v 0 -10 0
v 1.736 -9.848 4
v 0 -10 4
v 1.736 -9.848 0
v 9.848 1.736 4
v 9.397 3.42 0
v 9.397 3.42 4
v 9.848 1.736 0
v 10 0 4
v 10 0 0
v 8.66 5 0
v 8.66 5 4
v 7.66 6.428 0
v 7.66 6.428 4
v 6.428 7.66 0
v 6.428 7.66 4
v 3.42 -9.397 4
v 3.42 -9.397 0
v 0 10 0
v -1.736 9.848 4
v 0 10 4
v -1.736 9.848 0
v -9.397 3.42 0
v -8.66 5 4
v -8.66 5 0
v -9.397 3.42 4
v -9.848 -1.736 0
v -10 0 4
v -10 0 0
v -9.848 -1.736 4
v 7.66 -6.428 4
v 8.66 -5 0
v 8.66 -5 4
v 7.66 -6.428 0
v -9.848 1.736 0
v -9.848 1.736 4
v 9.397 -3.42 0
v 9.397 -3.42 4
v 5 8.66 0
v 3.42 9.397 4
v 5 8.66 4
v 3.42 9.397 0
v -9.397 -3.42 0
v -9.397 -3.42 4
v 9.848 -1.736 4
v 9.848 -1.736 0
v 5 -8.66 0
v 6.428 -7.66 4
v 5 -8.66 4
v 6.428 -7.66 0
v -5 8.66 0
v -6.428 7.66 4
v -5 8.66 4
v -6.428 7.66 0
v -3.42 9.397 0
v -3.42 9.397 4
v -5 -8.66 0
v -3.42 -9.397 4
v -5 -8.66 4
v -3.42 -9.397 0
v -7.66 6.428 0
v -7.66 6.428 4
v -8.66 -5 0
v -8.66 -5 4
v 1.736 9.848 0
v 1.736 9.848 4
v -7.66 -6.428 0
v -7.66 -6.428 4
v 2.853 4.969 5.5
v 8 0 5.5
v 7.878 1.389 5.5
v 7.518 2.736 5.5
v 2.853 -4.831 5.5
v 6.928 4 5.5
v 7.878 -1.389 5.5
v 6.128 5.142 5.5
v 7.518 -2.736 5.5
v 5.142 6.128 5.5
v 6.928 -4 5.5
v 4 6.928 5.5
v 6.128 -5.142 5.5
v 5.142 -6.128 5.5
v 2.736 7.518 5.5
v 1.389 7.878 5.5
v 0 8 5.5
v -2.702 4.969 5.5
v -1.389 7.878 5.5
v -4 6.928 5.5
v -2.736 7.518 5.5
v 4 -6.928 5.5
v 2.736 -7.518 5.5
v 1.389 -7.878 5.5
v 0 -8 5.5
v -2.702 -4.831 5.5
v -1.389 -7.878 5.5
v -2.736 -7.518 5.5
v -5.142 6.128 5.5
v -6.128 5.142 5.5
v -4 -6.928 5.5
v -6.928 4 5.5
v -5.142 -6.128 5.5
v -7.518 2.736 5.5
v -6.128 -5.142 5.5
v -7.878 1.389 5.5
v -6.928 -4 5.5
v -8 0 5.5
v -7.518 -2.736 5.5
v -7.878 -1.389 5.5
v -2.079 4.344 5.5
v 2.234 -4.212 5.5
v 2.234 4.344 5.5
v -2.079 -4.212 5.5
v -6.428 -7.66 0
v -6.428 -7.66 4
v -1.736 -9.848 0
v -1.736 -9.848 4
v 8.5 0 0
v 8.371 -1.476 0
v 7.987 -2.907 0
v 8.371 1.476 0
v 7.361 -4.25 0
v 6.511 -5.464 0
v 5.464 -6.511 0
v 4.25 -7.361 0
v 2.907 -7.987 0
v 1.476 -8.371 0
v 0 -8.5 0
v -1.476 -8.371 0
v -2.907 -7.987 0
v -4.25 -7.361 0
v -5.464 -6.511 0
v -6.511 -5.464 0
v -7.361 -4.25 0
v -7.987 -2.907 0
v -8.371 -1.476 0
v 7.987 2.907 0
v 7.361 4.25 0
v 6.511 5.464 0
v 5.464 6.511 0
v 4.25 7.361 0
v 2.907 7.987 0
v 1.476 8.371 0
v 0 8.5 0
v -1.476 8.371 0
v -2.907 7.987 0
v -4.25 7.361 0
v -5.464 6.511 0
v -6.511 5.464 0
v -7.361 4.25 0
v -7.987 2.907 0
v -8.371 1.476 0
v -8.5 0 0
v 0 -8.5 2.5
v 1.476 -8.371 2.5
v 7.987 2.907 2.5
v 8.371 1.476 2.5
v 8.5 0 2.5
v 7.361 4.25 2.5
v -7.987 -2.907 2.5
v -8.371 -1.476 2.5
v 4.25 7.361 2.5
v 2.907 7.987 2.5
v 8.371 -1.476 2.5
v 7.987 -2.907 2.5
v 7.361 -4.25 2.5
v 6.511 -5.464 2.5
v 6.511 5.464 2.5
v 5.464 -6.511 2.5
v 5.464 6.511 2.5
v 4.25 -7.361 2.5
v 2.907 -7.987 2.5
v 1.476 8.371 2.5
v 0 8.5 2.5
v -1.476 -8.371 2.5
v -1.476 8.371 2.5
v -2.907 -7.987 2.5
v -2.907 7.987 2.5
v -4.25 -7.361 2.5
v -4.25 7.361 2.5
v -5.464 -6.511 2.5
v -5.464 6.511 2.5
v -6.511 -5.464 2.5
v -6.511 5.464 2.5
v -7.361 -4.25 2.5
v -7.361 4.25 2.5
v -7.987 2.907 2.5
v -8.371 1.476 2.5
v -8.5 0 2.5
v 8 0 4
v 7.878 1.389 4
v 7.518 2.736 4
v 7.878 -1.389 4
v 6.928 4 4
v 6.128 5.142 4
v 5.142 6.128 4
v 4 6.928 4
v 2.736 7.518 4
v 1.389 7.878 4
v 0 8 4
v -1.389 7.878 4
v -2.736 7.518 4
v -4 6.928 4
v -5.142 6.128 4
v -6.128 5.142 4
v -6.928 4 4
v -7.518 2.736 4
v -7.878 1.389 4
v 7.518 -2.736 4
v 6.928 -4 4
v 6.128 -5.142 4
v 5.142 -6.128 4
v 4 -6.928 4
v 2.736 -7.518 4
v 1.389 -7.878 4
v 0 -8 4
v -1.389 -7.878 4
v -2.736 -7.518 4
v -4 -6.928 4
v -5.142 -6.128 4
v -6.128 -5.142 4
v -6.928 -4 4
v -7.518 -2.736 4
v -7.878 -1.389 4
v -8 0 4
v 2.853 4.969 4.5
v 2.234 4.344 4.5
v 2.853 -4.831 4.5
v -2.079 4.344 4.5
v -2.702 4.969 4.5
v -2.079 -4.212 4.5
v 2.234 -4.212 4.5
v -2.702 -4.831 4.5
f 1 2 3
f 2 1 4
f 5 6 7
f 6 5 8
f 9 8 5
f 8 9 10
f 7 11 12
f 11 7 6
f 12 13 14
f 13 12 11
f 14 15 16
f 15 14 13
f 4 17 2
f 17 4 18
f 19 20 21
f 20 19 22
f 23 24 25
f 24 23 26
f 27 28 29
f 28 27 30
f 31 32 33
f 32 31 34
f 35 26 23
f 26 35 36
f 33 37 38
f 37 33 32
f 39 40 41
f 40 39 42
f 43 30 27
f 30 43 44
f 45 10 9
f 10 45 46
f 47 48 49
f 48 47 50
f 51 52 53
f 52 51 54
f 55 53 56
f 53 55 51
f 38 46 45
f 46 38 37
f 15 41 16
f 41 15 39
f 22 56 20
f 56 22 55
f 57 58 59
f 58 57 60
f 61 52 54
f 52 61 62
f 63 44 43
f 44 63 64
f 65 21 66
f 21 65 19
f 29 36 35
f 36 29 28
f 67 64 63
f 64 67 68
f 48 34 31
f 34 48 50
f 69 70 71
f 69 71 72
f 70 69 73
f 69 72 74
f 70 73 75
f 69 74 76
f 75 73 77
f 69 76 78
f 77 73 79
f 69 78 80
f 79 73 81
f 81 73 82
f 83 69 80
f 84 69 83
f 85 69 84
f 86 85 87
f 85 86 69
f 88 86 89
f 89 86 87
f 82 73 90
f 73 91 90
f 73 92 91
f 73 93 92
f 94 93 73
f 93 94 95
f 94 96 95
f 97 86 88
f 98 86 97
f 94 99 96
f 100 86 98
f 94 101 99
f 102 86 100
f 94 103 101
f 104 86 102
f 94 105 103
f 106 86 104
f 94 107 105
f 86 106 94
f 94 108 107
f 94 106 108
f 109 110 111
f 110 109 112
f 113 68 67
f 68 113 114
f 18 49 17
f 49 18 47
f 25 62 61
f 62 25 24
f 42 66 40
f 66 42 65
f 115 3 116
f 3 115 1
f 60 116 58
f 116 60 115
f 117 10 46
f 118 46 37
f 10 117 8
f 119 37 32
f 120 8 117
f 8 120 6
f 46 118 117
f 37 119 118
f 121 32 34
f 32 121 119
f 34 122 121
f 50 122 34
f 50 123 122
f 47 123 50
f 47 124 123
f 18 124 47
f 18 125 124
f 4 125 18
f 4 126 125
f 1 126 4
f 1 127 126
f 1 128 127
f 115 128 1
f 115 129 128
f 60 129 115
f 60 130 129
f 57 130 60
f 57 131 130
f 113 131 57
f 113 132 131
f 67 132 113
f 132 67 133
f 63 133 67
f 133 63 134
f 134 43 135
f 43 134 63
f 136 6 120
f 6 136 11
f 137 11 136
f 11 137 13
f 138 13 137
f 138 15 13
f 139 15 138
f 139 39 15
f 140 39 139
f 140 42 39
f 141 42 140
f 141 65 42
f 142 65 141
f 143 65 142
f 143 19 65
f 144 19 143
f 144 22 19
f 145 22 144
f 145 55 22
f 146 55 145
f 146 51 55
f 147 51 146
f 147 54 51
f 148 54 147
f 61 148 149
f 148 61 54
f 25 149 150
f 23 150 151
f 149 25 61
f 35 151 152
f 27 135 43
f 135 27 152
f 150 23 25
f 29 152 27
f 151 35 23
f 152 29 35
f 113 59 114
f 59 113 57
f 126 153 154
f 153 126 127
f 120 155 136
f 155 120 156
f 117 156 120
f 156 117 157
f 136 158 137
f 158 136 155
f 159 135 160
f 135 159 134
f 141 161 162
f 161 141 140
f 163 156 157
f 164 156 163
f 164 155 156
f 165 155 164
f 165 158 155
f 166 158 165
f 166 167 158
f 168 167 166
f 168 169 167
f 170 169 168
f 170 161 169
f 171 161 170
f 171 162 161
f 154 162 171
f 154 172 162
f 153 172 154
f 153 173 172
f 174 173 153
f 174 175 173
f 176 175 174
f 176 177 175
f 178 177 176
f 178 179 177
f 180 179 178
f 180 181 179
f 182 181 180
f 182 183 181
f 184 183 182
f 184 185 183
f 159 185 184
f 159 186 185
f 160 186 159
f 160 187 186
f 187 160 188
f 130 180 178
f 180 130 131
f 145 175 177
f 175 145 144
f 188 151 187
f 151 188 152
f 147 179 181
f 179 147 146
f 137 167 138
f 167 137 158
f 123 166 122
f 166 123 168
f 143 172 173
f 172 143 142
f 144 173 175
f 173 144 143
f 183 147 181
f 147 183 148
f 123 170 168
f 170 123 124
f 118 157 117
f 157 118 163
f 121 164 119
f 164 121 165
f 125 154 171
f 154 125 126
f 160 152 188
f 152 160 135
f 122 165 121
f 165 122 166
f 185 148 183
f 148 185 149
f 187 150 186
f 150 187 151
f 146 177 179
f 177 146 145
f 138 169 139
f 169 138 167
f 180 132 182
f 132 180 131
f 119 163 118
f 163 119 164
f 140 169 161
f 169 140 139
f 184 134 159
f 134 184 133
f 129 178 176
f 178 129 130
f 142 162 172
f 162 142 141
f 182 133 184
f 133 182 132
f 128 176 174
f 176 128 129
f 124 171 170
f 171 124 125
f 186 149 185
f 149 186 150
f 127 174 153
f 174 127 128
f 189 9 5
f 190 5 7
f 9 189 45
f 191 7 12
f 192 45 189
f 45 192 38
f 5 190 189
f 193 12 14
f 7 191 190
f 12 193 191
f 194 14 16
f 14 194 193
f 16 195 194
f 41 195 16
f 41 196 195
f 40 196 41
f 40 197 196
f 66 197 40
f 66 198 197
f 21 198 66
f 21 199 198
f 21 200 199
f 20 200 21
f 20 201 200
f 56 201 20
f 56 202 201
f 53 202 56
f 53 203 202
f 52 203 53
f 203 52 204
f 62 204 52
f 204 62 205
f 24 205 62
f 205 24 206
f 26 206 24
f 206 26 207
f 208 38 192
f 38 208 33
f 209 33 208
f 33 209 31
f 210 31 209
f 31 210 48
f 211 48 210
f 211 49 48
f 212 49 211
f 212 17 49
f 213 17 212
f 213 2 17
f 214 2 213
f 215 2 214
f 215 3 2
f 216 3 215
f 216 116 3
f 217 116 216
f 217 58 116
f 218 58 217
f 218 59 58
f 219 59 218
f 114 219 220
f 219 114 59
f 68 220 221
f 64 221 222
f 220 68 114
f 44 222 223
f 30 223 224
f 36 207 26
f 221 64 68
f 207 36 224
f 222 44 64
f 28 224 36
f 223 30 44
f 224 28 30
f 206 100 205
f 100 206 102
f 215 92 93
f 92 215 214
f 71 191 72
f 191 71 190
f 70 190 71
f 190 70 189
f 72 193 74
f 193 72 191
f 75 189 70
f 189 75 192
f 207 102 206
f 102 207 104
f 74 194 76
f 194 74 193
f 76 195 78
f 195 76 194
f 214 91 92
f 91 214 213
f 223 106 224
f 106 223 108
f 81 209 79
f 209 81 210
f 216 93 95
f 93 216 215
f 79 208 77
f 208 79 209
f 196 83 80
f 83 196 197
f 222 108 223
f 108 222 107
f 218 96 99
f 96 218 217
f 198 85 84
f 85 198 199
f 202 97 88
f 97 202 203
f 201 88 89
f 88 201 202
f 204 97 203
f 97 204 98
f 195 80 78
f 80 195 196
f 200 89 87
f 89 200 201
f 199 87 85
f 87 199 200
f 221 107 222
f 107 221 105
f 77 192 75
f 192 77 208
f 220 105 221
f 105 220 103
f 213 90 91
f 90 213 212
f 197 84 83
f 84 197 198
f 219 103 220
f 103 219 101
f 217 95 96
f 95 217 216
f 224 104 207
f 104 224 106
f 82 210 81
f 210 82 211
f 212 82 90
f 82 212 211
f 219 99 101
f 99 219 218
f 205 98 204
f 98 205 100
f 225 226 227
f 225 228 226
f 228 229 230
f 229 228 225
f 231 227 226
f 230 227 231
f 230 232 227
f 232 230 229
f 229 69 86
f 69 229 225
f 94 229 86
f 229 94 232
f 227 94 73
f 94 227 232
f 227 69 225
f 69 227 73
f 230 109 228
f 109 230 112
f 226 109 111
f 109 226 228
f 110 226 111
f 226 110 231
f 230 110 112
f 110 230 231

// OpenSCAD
difference() {
	difference() {
		difference() {
			cylinder($fn = 36, h = 5.5000000000, r = 10);
			translate(v = [0, 0, -1]) {
				cylinder($fn = 36, h = 3.5000000000, r = 8.5000000000);
			}
		}
		translate(v = [0, 0, 4]) {
			difference() {
				cylinder($fn = 36, h = 3, r = 10.5000000000);
				cylinder($fn = 36, h = 3, r = 8);
			}
		}
	}
	translate(v = [0, 0, 4.5000000000]) {
		linear_extrude(height = 3) {
			text(font = "mana", halign = "center", size = 8, text = "\uE618", valign = "center");
		}
	}
}
